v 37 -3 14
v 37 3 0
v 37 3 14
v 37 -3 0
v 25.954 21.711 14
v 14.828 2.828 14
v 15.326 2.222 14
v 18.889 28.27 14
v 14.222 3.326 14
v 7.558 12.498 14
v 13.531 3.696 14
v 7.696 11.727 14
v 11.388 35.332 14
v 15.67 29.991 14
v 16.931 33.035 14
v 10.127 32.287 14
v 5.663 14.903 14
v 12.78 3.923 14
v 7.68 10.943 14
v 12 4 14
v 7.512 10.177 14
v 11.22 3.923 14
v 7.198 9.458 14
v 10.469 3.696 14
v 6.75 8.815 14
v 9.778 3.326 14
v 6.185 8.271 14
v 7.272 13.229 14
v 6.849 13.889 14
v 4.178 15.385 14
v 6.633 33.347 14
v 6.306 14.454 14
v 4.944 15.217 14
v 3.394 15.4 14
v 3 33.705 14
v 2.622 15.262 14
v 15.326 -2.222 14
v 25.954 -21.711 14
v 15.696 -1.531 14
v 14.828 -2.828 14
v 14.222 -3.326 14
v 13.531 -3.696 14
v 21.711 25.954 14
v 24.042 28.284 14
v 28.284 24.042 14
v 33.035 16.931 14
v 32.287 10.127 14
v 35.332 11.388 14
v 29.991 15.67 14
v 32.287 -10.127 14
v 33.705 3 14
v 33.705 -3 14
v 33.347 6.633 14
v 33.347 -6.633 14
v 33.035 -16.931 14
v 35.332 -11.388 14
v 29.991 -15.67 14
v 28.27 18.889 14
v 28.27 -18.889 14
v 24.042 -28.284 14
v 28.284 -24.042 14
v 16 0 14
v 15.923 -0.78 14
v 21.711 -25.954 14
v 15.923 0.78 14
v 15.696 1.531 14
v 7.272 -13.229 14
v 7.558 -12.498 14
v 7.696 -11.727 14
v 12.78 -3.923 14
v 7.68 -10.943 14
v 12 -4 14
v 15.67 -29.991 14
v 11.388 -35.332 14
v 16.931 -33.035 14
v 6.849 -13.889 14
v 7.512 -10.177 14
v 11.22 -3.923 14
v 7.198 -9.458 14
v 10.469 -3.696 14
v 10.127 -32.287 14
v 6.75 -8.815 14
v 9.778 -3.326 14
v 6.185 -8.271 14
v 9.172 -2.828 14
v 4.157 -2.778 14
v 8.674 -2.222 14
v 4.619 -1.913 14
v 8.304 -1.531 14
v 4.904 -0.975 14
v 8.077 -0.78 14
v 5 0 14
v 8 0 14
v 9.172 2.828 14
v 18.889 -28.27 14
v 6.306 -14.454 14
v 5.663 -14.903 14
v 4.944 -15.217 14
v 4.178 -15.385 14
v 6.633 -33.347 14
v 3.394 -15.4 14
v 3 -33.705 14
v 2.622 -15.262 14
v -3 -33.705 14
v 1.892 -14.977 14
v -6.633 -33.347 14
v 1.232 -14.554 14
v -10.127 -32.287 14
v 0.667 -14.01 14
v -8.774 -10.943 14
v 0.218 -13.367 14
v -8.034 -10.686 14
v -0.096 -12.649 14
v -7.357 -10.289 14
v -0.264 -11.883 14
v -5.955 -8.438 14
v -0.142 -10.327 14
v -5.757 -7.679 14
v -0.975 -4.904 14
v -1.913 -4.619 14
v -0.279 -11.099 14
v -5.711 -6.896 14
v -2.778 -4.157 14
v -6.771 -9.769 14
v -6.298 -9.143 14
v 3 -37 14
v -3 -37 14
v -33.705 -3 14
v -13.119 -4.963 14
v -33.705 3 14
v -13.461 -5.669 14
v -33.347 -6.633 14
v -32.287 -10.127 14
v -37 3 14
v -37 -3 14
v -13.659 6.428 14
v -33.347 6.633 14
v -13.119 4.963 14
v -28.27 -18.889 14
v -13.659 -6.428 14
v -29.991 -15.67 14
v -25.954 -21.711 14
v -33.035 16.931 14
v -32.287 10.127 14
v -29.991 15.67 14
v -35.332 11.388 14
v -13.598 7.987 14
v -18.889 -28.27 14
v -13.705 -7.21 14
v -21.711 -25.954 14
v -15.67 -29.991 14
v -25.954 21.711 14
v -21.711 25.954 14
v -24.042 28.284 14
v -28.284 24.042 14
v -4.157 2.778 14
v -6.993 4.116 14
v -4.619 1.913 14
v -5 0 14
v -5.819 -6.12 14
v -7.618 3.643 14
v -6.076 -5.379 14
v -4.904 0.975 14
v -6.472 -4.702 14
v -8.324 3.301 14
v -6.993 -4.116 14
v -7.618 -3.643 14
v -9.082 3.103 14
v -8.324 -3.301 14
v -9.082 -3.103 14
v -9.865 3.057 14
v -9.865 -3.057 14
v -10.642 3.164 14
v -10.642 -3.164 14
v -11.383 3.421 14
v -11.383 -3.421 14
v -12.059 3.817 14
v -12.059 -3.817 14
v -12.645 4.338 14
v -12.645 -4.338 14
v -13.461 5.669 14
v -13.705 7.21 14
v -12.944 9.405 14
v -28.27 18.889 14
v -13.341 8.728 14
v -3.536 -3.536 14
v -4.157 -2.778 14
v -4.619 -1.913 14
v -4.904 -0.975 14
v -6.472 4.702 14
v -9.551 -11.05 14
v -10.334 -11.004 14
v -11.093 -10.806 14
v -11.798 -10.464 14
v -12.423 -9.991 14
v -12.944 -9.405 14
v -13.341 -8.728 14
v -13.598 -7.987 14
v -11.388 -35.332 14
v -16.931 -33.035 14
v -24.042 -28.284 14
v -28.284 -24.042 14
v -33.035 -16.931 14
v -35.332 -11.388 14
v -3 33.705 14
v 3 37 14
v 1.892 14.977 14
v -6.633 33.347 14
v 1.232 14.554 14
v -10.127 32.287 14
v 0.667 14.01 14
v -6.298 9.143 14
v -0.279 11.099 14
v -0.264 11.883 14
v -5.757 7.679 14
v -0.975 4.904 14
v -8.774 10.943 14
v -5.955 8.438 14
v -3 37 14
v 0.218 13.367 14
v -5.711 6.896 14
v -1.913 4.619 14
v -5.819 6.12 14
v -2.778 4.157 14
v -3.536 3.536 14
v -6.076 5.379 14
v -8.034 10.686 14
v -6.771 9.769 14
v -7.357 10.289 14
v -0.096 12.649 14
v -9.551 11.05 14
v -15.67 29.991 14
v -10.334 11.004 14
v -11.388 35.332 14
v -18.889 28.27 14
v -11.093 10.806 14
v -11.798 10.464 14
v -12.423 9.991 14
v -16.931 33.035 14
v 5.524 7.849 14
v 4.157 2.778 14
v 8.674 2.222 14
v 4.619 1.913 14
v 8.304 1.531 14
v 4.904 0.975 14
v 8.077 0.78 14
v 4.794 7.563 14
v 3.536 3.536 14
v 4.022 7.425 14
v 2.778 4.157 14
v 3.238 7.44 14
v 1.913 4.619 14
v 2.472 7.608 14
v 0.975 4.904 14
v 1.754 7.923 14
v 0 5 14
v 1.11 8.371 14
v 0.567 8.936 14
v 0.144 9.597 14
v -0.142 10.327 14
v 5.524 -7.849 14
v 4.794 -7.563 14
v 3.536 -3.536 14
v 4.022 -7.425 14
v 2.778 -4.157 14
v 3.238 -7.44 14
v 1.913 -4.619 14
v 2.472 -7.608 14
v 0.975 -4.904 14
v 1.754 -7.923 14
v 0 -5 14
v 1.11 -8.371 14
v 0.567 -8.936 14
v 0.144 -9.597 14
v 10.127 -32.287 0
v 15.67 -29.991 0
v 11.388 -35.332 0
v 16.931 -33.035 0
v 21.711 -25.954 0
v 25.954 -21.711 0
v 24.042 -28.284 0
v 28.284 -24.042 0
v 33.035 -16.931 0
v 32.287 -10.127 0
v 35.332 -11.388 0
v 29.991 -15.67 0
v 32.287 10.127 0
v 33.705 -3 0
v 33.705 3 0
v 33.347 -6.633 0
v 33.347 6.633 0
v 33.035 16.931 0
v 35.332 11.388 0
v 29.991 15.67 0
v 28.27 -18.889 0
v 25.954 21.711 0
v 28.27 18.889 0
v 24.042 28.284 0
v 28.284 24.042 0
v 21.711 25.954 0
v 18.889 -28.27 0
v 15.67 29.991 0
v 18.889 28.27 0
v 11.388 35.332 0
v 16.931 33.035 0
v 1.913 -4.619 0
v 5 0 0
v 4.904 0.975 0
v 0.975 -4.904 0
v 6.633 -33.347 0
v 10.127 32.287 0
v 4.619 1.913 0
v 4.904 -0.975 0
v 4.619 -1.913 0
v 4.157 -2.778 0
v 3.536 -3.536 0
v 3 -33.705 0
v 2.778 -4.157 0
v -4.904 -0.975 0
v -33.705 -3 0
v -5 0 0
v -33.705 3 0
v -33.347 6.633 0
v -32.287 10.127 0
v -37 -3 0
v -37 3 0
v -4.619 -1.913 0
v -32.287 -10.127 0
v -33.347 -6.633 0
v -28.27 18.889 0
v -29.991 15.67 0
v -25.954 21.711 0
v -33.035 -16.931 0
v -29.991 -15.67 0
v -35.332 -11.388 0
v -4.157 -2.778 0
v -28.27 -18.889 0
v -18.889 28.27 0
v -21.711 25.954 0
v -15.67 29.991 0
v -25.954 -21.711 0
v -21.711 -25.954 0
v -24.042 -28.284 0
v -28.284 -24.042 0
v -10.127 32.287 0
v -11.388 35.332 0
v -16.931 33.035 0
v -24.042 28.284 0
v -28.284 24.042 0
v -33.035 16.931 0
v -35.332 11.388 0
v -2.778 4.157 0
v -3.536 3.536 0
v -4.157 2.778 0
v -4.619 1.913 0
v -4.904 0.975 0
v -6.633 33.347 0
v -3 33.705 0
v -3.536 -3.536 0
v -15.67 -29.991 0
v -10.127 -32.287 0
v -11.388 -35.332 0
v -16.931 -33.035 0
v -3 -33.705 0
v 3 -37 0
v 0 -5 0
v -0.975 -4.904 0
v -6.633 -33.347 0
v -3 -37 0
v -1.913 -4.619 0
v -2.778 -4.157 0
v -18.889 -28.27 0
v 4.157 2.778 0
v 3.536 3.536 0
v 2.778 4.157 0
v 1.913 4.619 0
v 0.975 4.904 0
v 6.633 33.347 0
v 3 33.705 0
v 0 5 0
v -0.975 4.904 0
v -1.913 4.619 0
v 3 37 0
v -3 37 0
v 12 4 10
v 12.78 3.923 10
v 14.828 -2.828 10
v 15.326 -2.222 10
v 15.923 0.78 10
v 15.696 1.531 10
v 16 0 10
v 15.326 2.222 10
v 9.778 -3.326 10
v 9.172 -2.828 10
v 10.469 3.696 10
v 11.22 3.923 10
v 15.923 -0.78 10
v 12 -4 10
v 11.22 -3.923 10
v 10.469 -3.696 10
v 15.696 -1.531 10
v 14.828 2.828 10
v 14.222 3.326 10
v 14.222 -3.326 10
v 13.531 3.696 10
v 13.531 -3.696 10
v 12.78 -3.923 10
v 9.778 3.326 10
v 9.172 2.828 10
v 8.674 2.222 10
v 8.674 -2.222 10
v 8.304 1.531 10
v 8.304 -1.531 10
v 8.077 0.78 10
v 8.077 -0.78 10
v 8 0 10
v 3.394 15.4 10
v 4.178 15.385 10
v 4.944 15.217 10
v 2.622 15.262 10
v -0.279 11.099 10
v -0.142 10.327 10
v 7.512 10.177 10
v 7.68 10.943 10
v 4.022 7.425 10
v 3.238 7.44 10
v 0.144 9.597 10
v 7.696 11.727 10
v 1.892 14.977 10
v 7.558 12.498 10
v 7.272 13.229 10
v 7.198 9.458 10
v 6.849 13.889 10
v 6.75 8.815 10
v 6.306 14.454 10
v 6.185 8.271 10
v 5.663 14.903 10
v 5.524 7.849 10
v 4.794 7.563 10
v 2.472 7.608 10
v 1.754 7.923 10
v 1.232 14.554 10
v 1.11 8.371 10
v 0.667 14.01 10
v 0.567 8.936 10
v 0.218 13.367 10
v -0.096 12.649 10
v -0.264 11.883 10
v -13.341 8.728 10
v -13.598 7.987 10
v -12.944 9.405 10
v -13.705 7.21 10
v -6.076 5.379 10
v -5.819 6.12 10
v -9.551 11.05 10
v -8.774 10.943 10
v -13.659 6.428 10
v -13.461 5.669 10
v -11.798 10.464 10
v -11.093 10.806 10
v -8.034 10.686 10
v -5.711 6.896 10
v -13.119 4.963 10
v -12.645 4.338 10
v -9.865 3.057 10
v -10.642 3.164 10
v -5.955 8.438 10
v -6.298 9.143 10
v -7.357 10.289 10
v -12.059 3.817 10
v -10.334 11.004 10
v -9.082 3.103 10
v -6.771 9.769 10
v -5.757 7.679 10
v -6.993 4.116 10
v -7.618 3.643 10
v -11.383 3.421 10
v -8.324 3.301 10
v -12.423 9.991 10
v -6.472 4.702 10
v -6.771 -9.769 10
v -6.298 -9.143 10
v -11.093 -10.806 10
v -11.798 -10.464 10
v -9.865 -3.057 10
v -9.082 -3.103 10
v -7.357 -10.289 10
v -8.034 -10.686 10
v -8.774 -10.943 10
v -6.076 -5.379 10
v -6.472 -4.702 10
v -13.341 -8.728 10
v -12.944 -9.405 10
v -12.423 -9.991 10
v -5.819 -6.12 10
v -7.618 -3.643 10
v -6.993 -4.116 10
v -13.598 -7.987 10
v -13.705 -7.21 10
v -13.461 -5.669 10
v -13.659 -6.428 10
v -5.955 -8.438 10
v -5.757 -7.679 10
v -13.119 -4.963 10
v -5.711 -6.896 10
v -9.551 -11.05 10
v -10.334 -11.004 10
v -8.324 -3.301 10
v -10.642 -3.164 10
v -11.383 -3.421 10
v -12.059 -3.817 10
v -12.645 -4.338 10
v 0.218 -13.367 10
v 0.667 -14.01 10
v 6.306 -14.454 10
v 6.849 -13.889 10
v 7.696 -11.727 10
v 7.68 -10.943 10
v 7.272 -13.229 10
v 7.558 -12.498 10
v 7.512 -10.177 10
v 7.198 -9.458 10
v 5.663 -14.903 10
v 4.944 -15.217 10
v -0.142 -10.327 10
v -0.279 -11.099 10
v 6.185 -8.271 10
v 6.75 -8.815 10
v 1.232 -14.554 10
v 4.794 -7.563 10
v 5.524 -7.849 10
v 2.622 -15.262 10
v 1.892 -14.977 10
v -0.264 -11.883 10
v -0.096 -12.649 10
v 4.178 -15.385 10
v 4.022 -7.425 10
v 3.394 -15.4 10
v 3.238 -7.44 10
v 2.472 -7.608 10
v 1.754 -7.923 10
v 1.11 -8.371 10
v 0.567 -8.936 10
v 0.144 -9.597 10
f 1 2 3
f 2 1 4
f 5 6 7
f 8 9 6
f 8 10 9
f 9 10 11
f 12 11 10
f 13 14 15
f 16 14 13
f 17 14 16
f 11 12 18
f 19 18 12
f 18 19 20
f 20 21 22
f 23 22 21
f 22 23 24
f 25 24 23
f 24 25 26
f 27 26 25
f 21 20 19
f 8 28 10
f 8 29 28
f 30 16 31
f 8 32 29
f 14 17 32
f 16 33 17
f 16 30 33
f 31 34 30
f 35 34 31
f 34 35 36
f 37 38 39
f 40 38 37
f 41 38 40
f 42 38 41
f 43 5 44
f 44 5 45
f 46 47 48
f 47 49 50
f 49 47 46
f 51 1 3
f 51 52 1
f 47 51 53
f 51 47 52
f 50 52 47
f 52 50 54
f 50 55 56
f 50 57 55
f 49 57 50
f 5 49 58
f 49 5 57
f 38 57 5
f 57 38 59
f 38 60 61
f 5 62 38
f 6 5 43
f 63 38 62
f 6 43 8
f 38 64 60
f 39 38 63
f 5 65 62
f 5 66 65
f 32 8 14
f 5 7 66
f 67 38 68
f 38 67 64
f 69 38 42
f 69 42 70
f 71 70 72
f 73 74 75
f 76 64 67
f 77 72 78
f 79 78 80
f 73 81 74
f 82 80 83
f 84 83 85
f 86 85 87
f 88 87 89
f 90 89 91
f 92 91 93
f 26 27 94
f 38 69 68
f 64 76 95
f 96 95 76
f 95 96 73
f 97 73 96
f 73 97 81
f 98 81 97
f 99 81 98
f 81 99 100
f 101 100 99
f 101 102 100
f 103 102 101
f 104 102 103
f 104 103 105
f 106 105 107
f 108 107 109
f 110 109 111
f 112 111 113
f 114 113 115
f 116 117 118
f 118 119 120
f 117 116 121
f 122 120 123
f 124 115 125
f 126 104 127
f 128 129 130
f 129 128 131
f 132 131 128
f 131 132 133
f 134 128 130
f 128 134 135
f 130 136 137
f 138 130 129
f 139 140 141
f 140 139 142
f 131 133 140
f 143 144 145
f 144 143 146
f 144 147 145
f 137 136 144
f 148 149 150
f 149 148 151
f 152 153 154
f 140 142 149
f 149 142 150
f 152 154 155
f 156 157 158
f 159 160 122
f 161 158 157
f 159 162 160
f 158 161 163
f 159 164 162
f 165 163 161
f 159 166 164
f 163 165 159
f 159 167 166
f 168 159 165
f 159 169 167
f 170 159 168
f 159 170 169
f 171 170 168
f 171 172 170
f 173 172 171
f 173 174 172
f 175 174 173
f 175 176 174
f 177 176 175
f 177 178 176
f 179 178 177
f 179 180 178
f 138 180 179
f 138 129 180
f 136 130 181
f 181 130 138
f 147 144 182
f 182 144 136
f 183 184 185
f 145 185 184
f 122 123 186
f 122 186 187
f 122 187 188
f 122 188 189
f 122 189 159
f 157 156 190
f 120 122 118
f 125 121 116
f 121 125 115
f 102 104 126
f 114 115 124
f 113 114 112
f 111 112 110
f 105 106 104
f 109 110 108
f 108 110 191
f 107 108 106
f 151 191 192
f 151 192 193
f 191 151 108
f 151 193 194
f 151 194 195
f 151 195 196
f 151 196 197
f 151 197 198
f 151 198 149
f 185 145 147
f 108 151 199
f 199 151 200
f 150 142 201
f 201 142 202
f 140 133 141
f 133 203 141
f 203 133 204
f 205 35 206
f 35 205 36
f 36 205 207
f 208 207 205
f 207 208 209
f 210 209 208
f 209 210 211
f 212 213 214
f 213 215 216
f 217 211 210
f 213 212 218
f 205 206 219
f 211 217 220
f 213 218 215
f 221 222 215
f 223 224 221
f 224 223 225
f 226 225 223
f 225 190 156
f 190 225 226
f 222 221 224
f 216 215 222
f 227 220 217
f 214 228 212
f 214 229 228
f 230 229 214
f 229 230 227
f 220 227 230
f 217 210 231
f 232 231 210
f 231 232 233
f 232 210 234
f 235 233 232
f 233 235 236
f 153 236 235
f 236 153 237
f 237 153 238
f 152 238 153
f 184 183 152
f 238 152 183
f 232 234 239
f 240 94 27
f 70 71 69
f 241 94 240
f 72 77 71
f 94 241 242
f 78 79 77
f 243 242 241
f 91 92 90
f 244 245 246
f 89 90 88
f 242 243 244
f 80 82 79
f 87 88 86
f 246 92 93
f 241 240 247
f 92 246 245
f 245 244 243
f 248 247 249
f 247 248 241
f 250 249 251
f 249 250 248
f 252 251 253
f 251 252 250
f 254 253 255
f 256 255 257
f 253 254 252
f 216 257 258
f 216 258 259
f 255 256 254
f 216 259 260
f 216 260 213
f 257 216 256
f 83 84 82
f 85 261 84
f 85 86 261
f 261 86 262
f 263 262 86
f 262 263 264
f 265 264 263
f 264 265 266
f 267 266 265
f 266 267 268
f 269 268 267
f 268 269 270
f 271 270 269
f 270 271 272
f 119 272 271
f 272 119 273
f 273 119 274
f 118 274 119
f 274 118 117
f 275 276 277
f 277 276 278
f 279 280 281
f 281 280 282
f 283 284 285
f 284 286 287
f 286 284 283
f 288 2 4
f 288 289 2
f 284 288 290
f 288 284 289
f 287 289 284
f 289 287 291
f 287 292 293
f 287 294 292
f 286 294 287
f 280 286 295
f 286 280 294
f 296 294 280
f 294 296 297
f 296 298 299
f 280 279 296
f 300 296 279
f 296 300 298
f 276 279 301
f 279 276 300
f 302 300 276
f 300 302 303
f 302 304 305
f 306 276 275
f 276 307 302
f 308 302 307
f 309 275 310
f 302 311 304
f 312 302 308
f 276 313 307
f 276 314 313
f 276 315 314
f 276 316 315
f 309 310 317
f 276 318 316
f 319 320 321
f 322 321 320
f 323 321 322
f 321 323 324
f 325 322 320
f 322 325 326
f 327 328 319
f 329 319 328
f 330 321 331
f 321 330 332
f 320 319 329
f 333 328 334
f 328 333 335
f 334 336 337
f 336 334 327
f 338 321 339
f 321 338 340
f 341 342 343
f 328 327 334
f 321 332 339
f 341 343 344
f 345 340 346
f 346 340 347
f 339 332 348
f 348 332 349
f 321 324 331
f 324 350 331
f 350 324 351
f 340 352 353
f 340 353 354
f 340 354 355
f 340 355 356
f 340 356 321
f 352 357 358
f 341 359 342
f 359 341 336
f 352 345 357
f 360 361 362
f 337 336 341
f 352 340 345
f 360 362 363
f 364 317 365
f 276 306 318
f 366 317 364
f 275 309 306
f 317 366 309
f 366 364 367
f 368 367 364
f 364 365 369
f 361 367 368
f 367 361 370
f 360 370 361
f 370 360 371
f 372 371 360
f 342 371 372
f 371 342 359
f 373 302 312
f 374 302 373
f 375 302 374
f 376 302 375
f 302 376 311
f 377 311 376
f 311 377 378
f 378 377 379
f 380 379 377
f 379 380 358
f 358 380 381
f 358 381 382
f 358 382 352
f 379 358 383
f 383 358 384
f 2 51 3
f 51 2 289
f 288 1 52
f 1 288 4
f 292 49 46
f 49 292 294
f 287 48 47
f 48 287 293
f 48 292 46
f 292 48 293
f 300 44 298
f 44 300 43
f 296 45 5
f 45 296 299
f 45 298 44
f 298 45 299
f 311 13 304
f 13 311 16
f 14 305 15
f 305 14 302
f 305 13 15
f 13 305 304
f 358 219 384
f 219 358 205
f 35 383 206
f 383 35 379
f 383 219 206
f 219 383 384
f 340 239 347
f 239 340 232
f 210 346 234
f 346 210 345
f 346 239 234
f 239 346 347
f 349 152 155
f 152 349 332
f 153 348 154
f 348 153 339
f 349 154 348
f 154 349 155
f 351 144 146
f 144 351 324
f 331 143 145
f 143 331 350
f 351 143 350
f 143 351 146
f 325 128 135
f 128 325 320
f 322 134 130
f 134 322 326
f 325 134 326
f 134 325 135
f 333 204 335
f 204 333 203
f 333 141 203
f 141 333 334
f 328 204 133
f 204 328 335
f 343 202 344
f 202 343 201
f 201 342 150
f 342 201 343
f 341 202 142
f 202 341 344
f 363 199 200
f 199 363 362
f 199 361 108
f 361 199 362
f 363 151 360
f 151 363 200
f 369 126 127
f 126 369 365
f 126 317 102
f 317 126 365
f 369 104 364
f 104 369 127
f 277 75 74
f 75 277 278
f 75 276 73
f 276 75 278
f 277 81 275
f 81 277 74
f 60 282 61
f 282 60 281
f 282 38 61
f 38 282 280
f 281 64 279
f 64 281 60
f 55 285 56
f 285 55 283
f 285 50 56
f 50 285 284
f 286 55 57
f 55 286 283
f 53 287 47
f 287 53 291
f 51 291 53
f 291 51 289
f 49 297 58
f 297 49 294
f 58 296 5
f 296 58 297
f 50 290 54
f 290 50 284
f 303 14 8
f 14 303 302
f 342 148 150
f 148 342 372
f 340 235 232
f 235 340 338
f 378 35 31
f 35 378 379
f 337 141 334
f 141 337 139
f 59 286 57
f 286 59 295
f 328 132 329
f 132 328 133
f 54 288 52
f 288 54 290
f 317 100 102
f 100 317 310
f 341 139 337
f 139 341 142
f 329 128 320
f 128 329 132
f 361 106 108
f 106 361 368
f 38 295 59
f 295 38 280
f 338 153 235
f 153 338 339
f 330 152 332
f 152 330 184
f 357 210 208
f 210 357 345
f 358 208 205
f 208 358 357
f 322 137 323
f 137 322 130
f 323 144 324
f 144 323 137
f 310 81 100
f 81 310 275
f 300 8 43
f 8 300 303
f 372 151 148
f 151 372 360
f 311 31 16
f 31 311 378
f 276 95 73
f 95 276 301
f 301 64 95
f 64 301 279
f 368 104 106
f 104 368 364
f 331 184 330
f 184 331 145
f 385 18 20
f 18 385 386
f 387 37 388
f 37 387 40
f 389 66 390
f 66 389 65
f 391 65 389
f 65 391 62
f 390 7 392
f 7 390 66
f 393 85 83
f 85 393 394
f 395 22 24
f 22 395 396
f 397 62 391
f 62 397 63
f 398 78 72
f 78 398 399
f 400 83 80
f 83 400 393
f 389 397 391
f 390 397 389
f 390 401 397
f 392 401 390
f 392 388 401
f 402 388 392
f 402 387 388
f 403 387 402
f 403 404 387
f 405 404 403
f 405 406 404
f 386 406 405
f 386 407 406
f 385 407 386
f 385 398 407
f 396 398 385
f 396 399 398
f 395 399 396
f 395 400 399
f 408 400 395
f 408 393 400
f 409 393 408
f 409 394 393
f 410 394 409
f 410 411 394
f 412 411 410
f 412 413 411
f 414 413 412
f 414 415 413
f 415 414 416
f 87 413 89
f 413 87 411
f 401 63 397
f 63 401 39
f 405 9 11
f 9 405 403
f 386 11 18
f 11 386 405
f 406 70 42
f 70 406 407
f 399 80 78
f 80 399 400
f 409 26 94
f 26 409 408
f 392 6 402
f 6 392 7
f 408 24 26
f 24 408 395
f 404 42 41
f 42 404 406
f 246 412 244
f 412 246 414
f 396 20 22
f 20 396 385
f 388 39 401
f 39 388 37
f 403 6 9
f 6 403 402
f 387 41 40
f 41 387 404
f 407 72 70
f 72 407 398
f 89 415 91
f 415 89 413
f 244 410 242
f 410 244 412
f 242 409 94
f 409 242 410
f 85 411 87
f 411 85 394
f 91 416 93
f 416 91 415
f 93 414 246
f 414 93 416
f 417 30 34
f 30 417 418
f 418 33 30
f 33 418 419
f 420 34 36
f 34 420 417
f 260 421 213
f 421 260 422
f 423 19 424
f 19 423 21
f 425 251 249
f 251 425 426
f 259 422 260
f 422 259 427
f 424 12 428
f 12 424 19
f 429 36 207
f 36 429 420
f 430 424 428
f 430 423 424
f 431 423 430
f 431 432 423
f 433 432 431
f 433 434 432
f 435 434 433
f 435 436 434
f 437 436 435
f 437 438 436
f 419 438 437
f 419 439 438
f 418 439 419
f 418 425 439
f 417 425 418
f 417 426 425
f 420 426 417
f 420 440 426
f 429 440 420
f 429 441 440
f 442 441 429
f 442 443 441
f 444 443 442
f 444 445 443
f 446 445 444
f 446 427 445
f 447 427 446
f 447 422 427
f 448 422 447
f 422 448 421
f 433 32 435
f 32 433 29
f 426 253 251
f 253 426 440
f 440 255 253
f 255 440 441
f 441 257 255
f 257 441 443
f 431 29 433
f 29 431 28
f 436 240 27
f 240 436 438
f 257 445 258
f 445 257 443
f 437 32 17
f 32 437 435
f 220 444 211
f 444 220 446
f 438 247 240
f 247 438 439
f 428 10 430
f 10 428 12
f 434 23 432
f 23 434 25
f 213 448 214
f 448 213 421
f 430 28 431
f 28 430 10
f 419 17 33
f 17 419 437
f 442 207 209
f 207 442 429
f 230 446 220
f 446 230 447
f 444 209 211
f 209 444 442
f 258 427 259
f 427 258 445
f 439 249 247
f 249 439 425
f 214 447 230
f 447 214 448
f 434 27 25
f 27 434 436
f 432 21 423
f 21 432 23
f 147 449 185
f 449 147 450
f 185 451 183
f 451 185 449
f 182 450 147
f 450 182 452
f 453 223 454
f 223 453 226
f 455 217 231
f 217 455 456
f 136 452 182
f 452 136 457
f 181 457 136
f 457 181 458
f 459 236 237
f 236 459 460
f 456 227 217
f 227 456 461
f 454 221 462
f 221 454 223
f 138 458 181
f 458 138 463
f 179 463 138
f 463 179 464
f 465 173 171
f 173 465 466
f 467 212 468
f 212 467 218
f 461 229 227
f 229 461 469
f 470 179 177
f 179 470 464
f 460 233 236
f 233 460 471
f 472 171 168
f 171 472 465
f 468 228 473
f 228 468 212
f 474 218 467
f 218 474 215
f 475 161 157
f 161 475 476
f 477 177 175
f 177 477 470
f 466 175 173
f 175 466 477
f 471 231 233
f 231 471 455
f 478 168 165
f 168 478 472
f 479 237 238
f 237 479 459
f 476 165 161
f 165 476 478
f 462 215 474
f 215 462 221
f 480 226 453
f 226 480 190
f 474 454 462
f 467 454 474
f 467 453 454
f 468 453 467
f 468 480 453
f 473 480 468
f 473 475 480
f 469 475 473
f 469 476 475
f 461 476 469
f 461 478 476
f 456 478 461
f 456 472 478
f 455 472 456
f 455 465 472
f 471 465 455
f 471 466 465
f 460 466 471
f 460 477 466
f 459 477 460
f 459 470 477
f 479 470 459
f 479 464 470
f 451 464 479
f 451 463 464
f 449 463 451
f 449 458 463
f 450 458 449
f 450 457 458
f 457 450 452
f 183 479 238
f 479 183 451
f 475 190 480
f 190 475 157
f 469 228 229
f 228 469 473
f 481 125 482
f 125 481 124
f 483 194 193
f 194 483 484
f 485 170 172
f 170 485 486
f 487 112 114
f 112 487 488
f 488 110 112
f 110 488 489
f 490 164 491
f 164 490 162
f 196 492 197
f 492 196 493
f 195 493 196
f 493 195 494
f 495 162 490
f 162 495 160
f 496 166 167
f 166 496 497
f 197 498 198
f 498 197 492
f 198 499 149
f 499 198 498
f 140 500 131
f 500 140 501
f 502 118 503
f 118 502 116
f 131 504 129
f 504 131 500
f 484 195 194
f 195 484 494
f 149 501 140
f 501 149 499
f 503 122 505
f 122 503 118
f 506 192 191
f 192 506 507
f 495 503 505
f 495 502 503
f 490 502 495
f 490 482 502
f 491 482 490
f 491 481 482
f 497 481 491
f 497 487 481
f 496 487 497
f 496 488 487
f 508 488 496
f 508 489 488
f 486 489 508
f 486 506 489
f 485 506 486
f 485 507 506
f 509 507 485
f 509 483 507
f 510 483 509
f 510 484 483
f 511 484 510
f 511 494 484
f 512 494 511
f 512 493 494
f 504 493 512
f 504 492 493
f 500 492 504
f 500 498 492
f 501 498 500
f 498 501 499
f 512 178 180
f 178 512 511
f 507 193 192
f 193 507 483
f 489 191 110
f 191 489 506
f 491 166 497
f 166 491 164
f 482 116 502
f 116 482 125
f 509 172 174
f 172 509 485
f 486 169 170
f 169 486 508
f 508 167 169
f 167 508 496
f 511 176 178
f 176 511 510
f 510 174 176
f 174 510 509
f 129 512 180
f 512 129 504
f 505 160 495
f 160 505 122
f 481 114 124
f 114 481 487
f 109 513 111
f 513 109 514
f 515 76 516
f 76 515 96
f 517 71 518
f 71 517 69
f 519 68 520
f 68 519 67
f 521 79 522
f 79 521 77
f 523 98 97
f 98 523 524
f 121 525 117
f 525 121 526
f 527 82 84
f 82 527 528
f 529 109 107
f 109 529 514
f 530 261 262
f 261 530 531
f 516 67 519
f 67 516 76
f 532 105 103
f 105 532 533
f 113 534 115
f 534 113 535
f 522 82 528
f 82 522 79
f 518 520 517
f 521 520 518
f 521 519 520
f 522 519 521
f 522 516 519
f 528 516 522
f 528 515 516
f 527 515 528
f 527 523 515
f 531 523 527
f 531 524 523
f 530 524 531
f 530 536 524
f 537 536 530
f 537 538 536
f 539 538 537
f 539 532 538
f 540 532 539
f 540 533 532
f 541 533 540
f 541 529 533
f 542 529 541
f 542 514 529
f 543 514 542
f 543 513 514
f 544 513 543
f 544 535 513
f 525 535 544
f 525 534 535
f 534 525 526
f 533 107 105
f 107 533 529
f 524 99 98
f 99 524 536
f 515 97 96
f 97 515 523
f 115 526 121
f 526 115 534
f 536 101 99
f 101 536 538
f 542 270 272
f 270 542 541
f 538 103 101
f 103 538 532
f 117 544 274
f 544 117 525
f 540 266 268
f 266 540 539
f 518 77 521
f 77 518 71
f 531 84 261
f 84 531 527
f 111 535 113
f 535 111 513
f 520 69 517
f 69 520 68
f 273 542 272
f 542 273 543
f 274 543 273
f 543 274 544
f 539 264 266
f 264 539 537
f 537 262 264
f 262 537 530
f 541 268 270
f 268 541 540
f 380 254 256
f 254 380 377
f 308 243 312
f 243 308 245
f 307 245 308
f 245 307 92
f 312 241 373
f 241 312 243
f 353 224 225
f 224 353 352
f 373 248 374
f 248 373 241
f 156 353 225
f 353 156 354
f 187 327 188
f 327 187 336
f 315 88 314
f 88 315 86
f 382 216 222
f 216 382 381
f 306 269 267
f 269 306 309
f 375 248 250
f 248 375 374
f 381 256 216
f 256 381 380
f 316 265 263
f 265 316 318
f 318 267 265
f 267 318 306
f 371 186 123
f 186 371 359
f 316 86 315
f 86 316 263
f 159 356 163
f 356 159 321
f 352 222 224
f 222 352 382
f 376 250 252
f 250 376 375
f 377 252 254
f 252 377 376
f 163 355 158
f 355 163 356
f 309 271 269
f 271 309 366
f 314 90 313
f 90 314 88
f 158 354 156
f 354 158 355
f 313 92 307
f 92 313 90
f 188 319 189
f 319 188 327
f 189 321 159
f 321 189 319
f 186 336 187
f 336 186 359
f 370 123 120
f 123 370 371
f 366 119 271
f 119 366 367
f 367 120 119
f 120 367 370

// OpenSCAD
$fn = 32;

// ----------------------------------------------------------------------
// Spur blank: lightened gear blank
// ----------------------------------------------------------------------

// --- parameters (mm) ---
disc_r = 34;              // blank root radius
disc_t = 14;              // blank thickness
n_teeth = 16;             // stub tooth count
tooth_w = 6;              // tooth width at the root
tooth_h = 3;              // tooth height above the root
bore_r = 5;               // central bore radius
ring_r = 12;              // lightening pocket ring radius
pocket_r = 4;             // lightening pocket radius

out_r = disc_r + tooth_h;  // tip radius
bbox_x = 74.0;  // measured width over the teeth
bbox_y = 74.0;  // measured depth over the teeth

difference() {
union() {
  cylinder(r = disc_r, h = disc_t);
  for (i = [0 : n_teeth - 1])
    rotate([0, 0, i * 360 / n_teeth])
      translate([disc_r - 1, -tooth_w / 2, 0])
        cube([tooth_h + 1, tooth_w, disc_t]);
}
  translate([0, 0, -1]) cylinder(r = bore_r, h = disc_t + 2);
  for (i = [0 : 5])
    rotate([0, 0, i * 72])
      translate([ring_r, 0, disc_t - 4])
        cylinder(r = pocket_r, h = 5);
}
